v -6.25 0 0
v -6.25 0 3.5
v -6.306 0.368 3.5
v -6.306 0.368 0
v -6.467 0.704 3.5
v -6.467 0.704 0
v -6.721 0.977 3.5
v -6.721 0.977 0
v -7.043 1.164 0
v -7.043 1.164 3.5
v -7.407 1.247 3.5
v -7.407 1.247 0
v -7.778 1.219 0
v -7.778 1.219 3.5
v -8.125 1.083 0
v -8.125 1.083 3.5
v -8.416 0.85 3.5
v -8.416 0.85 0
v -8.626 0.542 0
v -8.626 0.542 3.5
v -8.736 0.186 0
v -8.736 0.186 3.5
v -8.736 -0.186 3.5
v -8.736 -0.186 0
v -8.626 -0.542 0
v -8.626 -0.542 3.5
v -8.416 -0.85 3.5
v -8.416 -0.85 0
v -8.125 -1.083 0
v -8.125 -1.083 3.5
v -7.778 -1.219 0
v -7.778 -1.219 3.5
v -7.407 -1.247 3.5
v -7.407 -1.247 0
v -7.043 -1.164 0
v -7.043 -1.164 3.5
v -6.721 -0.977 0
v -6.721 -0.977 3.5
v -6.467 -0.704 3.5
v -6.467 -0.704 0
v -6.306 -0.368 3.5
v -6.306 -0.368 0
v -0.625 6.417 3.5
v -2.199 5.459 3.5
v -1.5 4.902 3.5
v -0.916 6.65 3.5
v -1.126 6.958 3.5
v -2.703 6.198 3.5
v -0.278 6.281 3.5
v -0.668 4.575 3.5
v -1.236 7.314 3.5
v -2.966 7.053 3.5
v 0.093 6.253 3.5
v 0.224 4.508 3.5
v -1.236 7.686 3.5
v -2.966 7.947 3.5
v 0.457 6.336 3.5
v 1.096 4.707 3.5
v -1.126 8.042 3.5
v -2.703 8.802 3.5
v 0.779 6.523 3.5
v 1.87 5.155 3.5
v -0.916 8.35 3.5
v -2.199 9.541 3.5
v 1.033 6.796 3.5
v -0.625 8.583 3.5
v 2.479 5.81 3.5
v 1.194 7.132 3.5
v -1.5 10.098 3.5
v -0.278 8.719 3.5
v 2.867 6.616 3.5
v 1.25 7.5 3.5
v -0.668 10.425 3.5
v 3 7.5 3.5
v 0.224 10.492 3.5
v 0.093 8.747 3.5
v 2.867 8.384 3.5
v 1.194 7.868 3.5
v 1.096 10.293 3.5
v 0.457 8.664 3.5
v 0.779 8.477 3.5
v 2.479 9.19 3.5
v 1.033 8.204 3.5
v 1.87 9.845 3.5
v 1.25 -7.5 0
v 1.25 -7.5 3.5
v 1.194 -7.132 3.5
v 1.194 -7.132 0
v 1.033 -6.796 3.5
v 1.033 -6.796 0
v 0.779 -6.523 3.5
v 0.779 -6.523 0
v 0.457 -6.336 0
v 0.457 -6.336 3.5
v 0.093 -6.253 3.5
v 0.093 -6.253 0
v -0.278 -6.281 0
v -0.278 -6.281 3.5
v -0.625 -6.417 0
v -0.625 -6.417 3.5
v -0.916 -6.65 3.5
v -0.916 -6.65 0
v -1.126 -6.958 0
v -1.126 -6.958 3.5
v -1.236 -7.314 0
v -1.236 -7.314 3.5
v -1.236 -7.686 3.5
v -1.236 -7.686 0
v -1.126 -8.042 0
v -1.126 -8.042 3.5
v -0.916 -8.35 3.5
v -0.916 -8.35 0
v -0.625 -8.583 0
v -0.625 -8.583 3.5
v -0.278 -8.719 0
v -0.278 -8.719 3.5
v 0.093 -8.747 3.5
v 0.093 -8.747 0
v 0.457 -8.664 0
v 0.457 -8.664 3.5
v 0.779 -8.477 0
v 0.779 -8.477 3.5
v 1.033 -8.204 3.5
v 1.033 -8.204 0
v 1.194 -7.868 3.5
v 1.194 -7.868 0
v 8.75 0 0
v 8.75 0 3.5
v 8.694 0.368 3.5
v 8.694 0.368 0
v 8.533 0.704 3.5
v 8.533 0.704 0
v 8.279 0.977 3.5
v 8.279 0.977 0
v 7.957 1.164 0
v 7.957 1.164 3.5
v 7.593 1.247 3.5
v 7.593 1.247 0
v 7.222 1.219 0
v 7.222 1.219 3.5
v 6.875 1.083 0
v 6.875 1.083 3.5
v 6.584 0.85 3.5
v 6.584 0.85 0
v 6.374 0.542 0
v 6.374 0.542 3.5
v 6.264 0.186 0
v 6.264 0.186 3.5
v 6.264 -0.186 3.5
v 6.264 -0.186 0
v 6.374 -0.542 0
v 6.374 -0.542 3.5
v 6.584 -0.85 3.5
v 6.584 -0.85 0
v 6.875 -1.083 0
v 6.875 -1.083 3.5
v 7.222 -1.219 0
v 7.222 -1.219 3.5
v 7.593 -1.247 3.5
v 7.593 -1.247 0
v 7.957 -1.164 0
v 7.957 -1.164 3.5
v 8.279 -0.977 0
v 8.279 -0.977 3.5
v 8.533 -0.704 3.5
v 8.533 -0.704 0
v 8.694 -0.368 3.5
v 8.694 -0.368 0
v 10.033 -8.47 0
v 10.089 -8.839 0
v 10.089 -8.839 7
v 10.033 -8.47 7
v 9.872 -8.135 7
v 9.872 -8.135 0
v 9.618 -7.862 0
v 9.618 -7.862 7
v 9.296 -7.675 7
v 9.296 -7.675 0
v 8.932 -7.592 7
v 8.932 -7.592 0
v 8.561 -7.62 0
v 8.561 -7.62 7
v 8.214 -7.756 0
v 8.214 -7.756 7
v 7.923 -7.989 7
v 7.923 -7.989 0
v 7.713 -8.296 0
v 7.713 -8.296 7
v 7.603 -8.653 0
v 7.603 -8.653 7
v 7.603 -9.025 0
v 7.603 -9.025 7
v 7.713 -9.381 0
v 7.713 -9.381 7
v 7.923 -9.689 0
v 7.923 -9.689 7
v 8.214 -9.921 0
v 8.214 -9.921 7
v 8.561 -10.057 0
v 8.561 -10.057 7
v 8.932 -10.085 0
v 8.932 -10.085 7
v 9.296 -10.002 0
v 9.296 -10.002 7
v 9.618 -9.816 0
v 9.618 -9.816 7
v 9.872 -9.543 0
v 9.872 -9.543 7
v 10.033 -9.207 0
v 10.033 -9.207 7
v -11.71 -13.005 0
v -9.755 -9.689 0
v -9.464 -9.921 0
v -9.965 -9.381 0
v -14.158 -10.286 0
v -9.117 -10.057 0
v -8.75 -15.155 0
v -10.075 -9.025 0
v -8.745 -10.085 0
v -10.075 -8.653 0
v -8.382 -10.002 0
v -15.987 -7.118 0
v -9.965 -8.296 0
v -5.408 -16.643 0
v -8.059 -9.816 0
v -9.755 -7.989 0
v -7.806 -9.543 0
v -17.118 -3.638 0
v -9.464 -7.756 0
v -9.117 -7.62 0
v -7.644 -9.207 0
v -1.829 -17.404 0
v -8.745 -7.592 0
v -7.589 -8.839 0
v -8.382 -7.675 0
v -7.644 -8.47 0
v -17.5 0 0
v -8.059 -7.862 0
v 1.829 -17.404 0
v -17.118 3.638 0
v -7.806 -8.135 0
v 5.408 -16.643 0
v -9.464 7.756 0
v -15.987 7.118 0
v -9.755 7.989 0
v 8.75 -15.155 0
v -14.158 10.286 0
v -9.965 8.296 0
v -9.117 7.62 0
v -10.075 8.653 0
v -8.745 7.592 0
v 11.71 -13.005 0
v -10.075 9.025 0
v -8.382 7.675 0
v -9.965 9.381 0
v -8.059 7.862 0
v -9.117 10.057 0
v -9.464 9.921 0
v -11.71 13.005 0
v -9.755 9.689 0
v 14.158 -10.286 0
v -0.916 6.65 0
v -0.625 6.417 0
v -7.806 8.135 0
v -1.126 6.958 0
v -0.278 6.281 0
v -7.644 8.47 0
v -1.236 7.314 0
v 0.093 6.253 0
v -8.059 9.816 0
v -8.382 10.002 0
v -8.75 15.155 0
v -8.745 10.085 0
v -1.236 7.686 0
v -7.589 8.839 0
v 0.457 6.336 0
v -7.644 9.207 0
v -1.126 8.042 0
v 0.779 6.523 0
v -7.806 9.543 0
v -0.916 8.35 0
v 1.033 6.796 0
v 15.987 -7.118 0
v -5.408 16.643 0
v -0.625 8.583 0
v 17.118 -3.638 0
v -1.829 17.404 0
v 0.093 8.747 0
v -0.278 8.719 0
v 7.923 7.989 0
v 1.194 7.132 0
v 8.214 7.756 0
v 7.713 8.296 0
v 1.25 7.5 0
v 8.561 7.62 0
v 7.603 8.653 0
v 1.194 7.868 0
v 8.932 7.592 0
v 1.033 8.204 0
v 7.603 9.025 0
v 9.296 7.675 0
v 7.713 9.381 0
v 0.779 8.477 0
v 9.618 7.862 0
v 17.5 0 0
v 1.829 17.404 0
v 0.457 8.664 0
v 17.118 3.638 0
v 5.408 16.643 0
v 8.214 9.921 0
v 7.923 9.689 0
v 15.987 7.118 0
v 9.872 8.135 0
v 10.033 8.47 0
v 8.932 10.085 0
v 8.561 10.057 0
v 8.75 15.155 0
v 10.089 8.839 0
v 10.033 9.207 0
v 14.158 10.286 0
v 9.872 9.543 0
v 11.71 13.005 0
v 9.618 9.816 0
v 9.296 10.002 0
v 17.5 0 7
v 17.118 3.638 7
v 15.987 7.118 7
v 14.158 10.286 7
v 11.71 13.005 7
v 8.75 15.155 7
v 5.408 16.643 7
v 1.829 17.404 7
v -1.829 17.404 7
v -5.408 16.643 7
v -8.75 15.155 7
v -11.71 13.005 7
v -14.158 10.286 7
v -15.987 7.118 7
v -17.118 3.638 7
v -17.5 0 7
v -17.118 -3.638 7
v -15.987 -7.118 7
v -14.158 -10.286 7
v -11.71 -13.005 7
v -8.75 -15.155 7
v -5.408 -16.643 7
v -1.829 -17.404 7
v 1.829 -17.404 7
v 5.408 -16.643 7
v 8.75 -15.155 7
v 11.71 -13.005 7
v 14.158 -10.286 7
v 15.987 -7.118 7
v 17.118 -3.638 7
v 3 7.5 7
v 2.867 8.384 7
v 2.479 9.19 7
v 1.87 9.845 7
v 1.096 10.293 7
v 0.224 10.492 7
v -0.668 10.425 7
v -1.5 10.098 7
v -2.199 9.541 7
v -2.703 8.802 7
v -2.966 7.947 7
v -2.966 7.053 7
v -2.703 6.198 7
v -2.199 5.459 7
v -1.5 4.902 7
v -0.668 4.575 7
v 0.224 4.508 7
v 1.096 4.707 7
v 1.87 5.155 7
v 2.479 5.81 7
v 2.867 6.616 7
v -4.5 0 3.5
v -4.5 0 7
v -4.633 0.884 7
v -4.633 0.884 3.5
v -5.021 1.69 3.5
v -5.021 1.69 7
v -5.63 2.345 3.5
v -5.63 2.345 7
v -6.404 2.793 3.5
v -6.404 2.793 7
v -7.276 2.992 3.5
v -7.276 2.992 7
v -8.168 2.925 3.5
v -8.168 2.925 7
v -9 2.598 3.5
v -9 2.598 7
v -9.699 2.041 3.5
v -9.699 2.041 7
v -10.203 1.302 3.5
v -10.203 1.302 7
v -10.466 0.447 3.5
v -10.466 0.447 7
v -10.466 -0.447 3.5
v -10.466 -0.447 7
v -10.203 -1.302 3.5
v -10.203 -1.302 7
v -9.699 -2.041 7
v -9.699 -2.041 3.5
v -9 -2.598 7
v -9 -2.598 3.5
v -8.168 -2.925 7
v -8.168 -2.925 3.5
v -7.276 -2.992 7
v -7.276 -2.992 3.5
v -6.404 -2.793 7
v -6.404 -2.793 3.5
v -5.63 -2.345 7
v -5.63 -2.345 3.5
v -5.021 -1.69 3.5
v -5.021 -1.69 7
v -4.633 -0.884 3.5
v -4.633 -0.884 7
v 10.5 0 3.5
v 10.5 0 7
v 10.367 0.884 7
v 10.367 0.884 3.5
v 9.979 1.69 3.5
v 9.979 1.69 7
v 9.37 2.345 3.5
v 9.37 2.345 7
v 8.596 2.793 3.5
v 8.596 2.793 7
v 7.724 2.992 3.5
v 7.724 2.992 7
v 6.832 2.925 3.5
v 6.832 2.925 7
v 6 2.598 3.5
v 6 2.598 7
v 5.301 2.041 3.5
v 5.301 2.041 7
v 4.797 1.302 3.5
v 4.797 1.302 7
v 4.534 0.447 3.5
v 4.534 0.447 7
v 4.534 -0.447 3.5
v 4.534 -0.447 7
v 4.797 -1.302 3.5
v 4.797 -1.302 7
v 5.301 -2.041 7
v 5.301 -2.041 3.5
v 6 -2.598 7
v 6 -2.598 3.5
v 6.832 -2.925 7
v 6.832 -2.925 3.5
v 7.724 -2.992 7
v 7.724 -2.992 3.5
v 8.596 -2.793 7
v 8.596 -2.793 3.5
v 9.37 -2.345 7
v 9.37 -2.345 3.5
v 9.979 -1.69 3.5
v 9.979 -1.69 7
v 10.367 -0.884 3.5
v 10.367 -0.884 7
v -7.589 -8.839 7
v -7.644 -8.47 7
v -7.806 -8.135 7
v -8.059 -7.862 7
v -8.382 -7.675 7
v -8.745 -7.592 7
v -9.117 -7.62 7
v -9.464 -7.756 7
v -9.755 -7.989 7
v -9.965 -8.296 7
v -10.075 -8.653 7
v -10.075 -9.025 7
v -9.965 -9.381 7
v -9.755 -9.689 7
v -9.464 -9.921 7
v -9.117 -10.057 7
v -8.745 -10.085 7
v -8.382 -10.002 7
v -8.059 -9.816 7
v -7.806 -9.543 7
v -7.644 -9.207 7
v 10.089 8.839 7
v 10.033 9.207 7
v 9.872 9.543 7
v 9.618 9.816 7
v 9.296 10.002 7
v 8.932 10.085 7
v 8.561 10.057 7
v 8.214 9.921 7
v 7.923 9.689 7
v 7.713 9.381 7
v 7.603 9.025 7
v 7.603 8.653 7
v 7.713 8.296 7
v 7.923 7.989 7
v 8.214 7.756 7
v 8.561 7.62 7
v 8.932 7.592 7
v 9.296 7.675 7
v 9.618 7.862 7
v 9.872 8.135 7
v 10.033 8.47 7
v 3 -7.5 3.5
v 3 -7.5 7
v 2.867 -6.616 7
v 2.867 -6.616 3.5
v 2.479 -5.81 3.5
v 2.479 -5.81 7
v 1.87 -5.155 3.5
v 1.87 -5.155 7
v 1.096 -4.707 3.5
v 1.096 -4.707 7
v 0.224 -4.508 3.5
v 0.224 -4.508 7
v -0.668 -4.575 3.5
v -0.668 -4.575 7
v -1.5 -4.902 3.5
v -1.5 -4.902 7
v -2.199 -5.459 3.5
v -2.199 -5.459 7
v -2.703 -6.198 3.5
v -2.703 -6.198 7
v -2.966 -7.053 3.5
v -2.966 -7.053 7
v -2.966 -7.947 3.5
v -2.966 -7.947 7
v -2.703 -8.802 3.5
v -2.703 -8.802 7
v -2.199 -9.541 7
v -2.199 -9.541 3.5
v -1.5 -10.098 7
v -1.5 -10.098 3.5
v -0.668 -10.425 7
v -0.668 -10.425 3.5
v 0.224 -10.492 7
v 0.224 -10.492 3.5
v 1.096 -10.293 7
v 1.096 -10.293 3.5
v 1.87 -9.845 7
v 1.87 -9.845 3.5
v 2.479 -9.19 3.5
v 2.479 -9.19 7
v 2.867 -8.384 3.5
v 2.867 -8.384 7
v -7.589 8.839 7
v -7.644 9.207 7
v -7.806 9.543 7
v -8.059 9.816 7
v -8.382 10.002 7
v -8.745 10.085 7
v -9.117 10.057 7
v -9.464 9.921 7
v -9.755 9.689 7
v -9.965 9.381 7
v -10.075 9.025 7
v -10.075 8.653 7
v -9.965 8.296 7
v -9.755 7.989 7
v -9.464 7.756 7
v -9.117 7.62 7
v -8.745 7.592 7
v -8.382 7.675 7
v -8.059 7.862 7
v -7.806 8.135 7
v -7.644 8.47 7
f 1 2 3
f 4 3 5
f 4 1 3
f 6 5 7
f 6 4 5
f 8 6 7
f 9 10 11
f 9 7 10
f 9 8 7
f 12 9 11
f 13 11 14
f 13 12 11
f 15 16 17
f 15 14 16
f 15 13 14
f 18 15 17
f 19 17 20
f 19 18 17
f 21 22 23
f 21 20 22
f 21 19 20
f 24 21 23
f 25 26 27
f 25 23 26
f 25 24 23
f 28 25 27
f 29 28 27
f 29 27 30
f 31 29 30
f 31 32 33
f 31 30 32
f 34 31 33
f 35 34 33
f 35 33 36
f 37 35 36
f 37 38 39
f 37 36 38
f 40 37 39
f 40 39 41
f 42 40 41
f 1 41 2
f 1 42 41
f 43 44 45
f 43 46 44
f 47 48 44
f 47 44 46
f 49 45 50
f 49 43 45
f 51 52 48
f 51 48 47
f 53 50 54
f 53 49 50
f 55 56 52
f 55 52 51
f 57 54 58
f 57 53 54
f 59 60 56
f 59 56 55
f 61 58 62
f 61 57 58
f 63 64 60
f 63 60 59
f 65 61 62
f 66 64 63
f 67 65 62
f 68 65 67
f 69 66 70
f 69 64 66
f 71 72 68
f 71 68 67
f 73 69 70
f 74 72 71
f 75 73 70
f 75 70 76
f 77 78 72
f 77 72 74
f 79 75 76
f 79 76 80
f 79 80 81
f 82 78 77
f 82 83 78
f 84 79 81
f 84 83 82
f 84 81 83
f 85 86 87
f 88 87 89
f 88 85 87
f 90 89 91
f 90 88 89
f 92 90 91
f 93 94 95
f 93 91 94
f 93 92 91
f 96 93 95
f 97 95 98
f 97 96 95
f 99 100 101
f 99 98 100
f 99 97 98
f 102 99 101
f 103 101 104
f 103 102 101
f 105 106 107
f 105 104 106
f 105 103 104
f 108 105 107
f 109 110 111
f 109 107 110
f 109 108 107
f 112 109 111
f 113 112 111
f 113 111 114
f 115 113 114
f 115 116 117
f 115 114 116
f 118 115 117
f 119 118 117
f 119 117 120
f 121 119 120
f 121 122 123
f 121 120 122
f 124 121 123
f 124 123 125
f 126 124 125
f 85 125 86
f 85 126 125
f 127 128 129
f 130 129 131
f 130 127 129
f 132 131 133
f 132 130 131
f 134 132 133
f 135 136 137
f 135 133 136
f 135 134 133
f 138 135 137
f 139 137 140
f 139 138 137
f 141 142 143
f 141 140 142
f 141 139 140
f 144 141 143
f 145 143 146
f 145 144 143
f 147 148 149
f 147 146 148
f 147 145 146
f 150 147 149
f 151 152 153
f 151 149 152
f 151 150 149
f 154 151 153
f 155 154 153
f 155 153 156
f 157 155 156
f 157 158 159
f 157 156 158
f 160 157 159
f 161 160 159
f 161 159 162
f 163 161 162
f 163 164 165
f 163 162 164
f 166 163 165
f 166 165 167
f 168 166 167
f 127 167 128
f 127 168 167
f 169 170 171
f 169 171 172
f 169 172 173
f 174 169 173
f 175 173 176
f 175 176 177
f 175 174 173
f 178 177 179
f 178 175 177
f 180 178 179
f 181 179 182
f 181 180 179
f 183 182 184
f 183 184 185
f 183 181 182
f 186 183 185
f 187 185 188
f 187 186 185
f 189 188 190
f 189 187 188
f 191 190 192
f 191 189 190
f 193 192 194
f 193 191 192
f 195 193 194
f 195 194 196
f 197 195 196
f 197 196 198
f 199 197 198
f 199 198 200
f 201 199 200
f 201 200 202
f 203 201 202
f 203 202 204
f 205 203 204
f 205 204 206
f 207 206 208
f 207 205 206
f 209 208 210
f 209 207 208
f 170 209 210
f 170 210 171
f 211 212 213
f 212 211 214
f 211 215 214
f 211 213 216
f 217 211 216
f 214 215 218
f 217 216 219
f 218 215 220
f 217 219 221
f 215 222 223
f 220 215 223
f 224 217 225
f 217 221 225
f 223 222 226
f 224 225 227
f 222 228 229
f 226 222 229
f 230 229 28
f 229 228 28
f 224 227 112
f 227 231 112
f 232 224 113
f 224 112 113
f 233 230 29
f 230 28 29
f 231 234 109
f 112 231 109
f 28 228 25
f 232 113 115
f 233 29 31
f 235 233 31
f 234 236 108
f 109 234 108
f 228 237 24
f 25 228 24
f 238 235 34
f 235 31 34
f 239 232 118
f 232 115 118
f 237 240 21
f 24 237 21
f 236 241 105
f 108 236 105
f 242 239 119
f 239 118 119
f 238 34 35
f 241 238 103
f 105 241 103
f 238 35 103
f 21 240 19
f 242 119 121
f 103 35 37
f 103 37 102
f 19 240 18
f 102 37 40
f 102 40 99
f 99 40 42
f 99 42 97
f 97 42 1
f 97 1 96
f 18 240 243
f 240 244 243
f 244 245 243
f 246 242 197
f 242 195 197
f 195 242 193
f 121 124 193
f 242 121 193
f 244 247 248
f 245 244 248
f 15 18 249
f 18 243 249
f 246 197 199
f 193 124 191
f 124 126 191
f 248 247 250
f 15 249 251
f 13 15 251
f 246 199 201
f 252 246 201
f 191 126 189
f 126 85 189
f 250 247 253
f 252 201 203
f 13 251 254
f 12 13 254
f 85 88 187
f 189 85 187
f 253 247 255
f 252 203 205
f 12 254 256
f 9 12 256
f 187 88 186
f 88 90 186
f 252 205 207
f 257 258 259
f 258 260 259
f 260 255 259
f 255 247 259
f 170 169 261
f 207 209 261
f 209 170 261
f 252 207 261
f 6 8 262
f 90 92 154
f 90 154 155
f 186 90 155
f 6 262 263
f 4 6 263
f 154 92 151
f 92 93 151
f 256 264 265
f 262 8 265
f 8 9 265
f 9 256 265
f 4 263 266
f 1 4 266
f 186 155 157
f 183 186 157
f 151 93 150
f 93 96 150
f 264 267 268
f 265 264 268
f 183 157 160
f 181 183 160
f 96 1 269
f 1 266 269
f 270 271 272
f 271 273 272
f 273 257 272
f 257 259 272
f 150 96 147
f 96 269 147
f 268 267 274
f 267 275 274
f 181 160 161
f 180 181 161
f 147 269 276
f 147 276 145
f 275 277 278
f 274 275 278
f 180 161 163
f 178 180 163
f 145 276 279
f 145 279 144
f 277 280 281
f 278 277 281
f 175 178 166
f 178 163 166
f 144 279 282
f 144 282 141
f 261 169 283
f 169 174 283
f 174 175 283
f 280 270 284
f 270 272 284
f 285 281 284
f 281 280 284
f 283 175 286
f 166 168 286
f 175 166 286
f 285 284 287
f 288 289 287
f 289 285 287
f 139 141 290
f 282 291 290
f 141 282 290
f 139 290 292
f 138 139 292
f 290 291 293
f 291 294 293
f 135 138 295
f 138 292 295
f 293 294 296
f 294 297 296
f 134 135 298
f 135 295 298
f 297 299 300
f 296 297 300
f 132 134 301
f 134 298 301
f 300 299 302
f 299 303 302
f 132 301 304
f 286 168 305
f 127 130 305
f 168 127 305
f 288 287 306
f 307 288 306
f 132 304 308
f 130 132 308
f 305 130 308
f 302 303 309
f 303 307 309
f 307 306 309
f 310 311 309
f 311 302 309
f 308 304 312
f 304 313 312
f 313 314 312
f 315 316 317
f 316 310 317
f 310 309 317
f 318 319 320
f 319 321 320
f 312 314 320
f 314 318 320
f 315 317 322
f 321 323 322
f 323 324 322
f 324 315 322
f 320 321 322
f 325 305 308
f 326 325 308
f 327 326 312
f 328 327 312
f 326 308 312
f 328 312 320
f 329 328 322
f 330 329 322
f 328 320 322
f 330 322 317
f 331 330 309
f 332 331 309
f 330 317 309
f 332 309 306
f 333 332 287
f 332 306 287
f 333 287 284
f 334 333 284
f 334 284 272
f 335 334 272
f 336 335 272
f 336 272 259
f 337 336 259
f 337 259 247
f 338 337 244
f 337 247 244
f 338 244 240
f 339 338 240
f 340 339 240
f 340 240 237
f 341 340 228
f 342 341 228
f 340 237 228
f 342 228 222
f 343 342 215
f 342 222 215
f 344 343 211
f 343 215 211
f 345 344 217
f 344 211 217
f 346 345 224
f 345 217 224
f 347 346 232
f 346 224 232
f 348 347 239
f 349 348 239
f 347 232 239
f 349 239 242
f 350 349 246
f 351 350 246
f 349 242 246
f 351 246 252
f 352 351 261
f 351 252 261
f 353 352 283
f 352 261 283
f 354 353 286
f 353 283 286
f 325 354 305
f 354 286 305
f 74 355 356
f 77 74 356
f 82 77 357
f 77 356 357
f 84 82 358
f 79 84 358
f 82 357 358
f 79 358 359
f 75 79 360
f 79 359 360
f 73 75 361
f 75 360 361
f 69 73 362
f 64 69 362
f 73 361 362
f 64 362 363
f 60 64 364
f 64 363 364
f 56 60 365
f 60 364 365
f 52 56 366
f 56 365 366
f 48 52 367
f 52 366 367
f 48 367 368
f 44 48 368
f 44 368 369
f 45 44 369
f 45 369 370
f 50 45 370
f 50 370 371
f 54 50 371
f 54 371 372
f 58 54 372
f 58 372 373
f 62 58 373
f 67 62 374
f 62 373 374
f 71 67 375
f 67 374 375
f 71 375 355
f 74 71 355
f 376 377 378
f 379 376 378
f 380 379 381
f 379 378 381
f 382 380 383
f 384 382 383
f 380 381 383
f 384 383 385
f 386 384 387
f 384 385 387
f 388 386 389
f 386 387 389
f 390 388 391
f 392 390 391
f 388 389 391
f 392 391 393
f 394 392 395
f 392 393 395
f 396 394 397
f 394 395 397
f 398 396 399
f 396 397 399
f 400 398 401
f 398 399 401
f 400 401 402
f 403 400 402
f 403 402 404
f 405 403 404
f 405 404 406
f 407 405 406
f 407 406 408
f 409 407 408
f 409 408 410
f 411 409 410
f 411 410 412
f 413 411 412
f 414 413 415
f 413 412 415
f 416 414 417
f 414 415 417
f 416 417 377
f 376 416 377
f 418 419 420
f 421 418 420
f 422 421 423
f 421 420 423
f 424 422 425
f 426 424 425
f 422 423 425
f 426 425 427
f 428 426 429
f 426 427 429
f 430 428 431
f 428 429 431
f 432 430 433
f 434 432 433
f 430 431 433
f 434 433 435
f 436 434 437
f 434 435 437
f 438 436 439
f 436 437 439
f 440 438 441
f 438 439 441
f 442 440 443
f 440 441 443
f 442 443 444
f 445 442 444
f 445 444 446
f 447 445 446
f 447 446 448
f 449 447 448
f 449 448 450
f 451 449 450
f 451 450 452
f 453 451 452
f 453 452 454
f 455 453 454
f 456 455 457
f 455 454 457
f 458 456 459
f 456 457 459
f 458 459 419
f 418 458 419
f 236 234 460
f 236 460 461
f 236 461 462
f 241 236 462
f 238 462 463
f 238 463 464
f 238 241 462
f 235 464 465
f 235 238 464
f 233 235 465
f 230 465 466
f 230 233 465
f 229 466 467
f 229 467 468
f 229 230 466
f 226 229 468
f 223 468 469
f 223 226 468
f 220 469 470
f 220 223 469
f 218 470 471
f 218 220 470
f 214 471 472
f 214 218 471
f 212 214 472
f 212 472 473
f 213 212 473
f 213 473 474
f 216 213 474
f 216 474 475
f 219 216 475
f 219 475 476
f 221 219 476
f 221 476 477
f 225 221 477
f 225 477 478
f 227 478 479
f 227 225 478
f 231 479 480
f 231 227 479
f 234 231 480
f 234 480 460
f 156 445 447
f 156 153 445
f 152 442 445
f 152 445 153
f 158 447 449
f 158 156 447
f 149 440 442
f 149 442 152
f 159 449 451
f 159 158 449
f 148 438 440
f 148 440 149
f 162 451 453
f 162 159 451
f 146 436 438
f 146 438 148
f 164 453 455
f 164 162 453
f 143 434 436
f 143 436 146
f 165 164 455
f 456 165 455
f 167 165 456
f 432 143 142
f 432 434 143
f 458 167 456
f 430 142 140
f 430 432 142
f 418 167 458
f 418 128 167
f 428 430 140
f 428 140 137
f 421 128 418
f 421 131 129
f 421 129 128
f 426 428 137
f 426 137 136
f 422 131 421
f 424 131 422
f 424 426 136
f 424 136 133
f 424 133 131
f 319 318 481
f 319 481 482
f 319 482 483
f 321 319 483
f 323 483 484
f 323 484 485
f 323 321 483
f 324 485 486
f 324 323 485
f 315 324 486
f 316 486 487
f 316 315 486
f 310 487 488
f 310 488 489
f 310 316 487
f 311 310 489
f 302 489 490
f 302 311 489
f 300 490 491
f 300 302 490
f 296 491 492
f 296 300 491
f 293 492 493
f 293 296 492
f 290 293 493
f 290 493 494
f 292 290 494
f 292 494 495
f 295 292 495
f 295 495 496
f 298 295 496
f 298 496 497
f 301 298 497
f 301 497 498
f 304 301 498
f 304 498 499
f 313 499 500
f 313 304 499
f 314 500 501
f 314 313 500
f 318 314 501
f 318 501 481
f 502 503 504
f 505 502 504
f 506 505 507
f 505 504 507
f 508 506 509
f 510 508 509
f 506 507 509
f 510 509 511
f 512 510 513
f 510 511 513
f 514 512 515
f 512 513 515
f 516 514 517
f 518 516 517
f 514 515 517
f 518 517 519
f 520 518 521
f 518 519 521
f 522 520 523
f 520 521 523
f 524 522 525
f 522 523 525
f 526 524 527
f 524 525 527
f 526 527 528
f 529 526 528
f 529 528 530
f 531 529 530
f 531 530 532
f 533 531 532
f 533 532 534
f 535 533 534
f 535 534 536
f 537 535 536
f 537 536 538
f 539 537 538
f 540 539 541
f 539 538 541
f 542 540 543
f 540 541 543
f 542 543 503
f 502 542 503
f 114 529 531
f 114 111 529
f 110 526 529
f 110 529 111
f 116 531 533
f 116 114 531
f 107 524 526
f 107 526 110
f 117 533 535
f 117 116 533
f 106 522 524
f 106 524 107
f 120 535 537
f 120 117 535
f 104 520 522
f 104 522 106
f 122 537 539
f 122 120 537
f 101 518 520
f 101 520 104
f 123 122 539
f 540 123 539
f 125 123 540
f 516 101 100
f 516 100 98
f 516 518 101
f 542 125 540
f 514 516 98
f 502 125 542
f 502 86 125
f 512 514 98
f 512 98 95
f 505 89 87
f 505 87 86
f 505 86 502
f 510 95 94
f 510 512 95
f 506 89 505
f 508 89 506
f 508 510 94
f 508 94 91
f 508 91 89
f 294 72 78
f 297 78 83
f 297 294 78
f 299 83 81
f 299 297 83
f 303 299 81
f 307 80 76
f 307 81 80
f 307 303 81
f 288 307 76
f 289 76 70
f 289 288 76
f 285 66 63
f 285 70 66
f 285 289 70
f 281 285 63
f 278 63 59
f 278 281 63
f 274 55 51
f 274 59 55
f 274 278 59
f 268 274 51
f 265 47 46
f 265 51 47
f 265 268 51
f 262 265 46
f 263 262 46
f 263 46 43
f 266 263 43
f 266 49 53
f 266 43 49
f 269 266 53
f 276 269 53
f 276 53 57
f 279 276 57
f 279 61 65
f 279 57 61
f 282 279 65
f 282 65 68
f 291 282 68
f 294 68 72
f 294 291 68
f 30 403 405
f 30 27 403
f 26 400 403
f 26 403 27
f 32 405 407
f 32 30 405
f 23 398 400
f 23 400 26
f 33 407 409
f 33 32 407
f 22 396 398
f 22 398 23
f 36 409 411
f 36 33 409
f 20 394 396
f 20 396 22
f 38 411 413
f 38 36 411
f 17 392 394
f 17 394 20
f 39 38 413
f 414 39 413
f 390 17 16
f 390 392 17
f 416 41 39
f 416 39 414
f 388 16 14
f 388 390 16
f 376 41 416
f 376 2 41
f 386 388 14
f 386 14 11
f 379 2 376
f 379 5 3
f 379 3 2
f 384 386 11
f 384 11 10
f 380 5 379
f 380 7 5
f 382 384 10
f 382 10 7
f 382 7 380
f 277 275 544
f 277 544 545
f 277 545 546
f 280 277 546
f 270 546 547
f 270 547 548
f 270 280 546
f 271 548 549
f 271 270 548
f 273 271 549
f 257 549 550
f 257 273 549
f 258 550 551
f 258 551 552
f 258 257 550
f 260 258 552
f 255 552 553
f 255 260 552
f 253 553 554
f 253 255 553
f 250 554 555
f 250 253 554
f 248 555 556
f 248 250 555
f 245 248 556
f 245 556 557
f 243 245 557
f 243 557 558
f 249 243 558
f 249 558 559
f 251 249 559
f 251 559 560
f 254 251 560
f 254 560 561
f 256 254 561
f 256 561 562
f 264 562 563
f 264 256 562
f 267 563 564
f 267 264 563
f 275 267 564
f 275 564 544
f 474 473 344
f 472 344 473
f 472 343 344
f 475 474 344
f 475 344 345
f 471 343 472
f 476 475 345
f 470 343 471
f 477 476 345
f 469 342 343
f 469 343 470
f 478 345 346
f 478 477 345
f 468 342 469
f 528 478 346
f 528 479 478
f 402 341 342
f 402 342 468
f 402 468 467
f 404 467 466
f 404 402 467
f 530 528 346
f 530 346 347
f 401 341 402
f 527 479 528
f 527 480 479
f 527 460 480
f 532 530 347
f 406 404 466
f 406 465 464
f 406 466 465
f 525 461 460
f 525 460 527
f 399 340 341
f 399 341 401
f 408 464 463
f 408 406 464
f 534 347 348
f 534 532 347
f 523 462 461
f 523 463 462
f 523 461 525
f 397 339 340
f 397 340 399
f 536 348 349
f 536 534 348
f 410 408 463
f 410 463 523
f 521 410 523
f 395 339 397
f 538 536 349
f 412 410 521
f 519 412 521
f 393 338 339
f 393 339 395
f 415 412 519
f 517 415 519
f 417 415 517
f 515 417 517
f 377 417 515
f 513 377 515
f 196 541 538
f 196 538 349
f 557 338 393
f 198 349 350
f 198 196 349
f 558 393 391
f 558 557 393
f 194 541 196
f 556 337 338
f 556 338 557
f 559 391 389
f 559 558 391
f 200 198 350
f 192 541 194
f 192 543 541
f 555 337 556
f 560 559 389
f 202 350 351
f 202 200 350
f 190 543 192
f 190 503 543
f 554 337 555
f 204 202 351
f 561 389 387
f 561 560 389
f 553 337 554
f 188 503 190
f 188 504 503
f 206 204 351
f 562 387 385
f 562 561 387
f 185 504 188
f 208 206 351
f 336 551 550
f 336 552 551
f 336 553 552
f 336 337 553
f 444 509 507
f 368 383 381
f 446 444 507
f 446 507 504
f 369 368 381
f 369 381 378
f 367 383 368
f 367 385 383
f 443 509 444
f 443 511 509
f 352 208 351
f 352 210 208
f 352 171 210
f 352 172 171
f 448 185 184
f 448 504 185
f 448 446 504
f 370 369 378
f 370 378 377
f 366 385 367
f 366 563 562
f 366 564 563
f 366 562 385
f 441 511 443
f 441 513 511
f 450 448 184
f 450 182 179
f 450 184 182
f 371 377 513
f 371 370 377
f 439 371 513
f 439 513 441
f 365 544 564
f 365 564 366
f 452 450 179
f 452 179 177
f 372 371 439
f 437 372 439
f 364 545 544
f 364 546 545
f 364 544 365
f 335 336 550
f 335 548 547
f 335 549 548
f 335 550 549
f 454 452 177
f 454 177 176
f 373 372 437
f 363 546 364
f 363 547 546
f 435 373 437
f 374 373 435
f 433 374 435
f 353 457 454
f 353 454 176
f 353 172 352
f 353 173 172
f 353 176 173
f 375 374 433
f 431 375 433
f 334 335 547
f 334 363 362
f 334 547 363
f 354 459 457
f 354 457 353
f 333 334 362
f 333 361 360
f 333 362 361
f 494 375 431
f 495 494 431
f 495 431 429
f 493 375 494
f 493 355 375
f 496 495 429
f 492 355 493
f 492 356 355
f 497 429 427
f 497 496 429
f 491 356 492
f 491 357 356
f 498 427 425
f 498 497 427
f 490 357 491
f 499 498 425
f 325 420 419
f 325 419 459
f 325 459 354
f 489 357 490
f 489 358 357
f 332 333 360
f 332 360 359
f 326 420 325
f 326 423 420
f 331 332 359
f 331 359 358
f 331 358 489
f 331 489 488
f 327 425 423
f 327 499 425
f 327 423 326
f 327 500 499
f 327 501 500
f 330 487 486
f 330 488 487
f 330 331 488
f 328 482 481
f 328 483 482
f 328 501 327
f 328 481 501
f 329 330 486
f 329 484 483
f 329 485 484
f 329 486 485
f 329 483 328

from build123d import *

# Parameters (mm, degrees)
SKETCH_1_R          = 17.5
SKETCH_1_R_2        = 1.25
EXTRUDE_1_DEPTH     = 7
SKETCH_2_R          = 3
CUT_EXTRUDE_1_DEPTH = 3.5


with BuildPart() as part:
    # 草图1 → 凸台-拉伸1 (new body)
    with BuildSketch(Plane.XY):
        Circle(SKETCH_1_R)
        with Locations((0, 7.5)):
            Circle(SKETCH_1_R_2, mode=Mode.SUBTRACT)
        with Locations((7.5, 0)):
            Circle(SKETCH_1_R_2, mode=Mode.SUBTRACT)
        with Locations((0, -7.5)):
            Circle(SKETCH_1_R_2, mode=Mode.SUBTRACT)
        with Locations((-7.5, 0)):
            Circle(SKETCH_1_R_2, mode=Mode.SUBTRACT)
        with Locations((8.838834765, 8.838834765)):
            Circle(SKETCH_1_R_2, mode=Mode.SUBTRACT)
        with Locations((8.838834765, -8.838834765)):
            Circle(SKETCH_1_R_2, mode=Mode.SUBTRACT)
        with Locations((-8.838834765, -8.838834765)):
            Circle(SKETCH_1_R_2, mode=Mode.SUBTRACT)
        with Locations((-8.838834765, 8.838834765)):
            Circle(SKETCH_1_R_2, mode=Mode.SUBTRACT)
    extrude(amount=EXTRUDE_1_DEPTH)

    # 草图2 → 切除-拉伸1 (cut)
    with BuildSketch(Plane.XY.offset(7)):
        with Locations((0, 7.5)):
            Circle(SKETCH_2_R)
        with Locations((7.5, 0)):
            Circle(SKETCH_2_R)
        with Locations((0, -7.5)):
            Circle(SKETCH_2_R)
        with Locations((-7.5, 0)):
            Circle(SKETCH_2_R)
    extrude(amount=-CUT_EXTRUDE_1_DEPTH, mode=Mode.SUBTRACT)


solid = part.part
